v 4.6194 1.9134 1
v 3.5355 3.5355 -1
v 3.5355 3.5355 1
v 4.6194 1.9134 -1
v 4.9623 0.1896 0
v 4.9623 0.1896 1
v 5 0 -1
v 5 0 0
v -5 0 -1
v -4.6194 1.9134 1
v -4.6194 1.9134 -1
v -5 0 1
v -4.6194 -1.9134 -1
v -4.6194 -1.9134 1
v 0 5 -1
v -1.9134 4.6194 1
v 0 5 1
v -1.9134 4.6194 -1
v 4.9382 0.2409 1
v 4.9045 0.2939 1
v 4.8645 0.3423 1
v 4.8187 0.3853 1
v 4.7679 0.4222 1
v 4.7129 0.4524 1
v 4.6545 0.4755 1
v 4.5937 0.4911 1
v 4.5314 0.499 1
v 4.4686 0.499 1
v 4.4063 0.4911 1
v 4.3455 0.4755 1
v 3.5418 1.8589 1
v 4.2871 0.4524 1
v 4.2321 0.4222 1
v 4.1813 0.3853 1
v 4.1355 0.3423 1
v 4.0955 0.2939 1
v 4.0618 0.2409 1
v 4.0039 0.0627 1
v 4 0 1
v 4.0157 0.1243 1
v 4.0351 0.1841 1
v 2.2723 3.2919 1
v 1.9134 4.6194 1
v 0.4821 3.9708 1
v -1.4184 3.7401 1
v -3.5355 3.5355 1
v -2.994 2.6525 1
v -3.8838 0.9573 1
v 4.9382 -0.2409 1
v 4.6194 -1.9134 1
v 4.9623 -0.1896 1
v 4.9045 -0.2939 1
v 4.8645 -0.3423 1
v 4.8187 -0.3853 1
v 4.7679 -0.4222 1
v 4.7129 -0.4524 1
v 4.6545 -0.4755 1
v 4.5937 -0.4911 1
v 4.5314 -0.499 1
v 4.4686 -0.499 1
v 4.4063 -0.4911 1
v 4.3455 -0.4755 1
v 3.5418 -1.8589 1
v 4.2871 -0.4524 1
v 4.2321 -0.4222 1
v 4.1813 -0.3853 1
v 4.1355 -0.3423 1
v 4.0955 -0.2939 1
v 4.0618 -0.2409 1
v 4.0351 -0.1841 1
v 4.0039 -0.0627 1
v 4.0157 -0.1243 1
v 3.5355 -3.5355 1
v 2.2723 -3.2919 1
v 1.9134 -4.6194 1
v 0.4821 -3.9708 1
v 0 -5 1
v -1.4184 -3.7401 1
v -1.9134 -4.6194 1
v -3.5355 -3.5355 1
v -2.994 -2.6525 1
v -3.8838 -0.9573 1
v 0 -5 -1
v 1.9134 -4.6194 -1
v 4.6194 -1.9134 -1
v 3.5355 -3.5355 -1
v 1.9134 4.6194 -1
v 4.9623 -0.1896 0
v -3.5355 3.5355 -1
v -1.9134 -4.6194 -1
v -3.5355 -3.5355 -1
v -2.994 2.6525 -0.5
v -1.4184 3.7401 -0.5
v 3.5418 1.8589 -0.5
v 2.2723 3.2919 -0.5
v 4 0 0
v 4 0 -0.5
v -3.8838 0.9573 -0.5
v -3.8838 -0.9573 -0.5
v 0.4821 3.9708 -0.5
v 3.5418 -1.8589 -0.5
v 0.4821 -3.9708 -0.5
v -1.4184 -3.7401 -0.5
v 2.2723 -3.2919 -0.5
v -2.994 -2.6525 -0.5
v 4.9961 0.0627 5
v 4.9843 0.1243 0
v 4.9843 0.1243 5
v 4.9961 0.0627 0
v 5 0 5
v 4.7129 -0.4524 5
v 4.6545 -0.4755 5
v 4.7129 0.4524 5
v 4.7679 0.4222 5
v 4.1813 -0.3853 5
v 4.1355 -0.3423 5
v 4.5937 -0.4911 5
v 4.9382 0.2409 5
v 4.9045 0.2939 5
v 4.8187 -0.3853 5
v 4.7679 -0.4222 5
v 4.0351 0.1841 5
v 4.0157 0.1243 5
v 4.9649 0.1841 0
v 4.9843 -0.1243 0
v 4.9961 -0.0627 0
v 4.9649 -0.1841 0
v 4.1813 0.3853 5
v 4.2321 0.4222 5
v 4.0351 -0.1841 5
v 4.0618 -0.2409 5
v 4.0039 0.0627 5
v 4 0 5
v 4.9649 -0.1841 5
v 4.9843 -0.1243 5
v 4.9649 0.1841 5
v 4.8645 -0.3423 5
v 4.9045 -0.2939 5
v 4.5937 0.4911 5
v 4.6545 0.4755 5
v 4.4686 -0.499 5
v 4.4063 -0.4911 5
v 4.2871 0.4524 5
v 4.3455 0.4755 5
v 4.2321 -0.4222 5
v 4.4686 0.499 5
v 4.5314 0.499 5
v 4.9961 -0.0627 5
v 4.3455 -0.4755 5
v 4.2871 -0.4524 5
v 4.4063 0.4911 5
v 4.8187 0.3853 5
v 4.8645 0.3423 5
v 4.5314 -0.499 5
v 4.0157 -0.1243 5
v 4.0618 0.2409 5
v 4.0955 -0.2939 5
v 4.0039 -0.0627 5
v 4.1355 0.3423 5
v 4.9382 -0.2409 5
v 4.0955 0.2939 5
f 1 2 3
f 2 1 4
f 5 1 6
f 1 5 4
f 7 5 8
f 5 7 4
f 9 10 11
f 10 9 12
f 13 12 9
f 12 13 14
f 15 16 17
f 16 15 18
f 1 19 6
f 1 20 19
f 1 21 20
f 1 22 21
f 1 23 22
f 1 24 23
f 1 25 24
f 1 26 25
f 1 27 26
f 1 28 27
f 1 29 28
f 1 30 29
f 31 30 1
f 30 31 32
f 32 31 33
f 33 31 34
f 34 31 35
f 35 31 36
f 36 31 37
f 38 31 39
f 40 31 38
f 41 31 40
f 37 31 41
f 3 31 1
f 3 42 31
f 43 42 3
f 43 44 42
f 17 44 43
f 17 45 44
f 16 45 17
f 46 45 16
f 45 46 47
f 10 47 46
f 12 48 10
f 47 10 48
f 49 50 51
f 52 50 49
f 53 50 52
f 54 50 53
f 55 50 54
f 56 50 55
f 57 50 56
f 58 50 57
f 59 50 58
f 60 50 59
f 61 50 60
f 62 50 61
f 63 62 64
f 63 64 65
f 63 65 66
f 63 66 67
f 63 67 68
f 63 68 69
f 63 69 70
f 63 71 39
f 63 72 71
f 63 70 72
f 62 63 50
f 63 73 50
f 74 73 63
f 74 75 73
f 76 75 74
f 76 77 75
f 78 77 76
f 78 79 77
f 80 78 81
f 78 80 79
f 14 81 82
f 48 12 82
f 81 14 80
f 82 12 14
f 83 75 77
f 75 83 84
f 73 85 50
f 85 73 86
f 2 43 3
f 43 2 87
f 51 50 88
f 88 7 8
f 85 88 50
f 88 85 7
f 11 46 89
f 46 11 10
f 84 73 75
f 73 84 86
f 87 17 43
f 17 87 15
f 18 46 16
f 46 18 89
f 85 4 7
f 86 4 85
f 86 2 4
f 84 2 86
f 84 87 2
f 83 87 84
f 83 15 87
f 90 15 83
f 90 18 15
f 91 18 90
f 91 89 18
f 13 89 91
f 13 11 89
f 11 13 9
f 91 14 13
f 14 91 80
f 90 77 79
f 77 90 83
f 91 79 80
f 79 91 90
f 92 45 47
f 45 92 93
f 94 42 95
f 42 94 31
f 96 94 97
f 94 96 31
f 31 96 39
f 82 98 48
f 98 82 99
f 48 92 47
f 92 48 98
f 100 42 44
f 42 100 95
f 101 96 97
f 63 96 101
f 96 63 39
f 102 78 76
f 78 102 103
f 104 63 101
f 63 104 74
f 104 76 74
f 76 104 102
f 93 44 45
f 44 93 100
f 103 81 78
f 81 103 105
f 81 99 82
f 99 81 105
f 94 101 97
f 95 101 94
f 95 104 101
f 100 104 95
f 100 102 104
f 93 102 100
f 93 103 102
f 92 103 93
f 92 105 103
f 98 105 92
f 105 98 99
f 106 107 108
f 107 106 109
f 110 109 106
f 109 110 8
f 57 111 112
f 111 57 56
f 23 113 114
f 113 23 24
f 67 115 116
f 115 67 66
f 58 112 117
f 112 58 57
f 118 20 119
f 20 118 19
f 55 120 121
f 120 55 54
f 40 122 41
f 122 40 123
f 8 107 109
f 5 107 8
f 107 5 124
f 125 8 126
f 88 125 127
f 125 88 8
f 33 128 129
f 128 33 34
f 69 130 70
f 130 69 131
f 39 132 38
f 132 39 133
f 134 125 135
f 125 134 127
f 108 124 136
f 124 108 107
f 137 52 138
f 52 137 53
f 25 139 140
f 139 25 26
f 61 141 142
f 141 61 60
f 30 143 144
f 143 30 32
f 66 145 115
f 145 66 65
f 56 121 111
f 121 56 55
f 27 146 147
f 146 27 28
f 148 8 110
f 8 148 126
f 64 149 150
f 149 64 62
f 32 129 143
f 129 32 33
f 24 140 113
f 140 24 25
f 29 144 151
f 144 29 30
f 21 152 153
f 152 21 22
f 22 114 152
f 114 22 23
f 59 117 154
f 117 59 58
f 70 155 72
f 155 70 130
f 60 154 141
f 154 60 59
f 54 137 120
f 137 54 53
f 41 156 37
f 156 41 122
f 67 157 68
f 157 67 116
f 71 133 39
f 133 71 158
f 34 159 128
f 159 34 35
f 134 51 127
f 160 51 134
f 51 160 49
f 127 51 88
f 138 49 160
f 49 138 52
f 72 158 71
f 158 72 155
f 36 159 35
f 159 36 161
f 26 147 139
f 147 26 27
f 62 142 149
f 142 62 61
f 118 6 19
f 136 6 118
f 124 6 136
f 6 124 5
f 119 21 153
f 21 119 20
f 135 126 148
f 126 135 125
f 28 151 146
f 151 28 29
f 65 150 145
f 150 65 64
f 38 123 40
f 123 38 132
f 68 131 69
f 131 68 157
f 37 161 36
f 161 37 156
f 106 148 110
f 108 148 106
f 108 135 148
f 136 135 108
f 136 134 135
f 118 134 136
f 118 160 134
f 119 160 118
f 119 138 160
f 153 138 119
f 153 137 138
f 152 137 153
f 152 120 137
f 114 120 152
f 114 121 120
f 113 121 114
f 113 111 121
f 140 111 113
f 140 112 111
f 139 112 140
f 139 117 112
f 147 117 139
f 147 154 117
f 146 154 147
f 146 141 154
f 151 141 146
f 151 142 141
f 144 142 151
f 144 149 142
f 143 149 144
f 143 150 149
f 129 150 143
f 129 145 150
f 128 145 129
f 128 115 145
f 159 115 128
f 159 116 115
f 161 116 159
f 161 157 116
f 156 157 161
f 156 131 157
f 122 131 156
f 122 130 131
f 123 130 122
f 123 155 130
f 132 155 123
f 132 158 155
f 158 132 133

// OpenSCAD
raio_roda = 5;
altura_pega_roda = 5;

difference(){
        cylinder(h=2, r=raio_roda, center = true);
    translate([0,0,1]){
        cylinder(h=3, r=4, center = true);
    } 
}

translate([raio_roda - 0.5, 0, 0]){
    cylinder(h=altura_pega_roda, r=0.5, $fn=50);
}
